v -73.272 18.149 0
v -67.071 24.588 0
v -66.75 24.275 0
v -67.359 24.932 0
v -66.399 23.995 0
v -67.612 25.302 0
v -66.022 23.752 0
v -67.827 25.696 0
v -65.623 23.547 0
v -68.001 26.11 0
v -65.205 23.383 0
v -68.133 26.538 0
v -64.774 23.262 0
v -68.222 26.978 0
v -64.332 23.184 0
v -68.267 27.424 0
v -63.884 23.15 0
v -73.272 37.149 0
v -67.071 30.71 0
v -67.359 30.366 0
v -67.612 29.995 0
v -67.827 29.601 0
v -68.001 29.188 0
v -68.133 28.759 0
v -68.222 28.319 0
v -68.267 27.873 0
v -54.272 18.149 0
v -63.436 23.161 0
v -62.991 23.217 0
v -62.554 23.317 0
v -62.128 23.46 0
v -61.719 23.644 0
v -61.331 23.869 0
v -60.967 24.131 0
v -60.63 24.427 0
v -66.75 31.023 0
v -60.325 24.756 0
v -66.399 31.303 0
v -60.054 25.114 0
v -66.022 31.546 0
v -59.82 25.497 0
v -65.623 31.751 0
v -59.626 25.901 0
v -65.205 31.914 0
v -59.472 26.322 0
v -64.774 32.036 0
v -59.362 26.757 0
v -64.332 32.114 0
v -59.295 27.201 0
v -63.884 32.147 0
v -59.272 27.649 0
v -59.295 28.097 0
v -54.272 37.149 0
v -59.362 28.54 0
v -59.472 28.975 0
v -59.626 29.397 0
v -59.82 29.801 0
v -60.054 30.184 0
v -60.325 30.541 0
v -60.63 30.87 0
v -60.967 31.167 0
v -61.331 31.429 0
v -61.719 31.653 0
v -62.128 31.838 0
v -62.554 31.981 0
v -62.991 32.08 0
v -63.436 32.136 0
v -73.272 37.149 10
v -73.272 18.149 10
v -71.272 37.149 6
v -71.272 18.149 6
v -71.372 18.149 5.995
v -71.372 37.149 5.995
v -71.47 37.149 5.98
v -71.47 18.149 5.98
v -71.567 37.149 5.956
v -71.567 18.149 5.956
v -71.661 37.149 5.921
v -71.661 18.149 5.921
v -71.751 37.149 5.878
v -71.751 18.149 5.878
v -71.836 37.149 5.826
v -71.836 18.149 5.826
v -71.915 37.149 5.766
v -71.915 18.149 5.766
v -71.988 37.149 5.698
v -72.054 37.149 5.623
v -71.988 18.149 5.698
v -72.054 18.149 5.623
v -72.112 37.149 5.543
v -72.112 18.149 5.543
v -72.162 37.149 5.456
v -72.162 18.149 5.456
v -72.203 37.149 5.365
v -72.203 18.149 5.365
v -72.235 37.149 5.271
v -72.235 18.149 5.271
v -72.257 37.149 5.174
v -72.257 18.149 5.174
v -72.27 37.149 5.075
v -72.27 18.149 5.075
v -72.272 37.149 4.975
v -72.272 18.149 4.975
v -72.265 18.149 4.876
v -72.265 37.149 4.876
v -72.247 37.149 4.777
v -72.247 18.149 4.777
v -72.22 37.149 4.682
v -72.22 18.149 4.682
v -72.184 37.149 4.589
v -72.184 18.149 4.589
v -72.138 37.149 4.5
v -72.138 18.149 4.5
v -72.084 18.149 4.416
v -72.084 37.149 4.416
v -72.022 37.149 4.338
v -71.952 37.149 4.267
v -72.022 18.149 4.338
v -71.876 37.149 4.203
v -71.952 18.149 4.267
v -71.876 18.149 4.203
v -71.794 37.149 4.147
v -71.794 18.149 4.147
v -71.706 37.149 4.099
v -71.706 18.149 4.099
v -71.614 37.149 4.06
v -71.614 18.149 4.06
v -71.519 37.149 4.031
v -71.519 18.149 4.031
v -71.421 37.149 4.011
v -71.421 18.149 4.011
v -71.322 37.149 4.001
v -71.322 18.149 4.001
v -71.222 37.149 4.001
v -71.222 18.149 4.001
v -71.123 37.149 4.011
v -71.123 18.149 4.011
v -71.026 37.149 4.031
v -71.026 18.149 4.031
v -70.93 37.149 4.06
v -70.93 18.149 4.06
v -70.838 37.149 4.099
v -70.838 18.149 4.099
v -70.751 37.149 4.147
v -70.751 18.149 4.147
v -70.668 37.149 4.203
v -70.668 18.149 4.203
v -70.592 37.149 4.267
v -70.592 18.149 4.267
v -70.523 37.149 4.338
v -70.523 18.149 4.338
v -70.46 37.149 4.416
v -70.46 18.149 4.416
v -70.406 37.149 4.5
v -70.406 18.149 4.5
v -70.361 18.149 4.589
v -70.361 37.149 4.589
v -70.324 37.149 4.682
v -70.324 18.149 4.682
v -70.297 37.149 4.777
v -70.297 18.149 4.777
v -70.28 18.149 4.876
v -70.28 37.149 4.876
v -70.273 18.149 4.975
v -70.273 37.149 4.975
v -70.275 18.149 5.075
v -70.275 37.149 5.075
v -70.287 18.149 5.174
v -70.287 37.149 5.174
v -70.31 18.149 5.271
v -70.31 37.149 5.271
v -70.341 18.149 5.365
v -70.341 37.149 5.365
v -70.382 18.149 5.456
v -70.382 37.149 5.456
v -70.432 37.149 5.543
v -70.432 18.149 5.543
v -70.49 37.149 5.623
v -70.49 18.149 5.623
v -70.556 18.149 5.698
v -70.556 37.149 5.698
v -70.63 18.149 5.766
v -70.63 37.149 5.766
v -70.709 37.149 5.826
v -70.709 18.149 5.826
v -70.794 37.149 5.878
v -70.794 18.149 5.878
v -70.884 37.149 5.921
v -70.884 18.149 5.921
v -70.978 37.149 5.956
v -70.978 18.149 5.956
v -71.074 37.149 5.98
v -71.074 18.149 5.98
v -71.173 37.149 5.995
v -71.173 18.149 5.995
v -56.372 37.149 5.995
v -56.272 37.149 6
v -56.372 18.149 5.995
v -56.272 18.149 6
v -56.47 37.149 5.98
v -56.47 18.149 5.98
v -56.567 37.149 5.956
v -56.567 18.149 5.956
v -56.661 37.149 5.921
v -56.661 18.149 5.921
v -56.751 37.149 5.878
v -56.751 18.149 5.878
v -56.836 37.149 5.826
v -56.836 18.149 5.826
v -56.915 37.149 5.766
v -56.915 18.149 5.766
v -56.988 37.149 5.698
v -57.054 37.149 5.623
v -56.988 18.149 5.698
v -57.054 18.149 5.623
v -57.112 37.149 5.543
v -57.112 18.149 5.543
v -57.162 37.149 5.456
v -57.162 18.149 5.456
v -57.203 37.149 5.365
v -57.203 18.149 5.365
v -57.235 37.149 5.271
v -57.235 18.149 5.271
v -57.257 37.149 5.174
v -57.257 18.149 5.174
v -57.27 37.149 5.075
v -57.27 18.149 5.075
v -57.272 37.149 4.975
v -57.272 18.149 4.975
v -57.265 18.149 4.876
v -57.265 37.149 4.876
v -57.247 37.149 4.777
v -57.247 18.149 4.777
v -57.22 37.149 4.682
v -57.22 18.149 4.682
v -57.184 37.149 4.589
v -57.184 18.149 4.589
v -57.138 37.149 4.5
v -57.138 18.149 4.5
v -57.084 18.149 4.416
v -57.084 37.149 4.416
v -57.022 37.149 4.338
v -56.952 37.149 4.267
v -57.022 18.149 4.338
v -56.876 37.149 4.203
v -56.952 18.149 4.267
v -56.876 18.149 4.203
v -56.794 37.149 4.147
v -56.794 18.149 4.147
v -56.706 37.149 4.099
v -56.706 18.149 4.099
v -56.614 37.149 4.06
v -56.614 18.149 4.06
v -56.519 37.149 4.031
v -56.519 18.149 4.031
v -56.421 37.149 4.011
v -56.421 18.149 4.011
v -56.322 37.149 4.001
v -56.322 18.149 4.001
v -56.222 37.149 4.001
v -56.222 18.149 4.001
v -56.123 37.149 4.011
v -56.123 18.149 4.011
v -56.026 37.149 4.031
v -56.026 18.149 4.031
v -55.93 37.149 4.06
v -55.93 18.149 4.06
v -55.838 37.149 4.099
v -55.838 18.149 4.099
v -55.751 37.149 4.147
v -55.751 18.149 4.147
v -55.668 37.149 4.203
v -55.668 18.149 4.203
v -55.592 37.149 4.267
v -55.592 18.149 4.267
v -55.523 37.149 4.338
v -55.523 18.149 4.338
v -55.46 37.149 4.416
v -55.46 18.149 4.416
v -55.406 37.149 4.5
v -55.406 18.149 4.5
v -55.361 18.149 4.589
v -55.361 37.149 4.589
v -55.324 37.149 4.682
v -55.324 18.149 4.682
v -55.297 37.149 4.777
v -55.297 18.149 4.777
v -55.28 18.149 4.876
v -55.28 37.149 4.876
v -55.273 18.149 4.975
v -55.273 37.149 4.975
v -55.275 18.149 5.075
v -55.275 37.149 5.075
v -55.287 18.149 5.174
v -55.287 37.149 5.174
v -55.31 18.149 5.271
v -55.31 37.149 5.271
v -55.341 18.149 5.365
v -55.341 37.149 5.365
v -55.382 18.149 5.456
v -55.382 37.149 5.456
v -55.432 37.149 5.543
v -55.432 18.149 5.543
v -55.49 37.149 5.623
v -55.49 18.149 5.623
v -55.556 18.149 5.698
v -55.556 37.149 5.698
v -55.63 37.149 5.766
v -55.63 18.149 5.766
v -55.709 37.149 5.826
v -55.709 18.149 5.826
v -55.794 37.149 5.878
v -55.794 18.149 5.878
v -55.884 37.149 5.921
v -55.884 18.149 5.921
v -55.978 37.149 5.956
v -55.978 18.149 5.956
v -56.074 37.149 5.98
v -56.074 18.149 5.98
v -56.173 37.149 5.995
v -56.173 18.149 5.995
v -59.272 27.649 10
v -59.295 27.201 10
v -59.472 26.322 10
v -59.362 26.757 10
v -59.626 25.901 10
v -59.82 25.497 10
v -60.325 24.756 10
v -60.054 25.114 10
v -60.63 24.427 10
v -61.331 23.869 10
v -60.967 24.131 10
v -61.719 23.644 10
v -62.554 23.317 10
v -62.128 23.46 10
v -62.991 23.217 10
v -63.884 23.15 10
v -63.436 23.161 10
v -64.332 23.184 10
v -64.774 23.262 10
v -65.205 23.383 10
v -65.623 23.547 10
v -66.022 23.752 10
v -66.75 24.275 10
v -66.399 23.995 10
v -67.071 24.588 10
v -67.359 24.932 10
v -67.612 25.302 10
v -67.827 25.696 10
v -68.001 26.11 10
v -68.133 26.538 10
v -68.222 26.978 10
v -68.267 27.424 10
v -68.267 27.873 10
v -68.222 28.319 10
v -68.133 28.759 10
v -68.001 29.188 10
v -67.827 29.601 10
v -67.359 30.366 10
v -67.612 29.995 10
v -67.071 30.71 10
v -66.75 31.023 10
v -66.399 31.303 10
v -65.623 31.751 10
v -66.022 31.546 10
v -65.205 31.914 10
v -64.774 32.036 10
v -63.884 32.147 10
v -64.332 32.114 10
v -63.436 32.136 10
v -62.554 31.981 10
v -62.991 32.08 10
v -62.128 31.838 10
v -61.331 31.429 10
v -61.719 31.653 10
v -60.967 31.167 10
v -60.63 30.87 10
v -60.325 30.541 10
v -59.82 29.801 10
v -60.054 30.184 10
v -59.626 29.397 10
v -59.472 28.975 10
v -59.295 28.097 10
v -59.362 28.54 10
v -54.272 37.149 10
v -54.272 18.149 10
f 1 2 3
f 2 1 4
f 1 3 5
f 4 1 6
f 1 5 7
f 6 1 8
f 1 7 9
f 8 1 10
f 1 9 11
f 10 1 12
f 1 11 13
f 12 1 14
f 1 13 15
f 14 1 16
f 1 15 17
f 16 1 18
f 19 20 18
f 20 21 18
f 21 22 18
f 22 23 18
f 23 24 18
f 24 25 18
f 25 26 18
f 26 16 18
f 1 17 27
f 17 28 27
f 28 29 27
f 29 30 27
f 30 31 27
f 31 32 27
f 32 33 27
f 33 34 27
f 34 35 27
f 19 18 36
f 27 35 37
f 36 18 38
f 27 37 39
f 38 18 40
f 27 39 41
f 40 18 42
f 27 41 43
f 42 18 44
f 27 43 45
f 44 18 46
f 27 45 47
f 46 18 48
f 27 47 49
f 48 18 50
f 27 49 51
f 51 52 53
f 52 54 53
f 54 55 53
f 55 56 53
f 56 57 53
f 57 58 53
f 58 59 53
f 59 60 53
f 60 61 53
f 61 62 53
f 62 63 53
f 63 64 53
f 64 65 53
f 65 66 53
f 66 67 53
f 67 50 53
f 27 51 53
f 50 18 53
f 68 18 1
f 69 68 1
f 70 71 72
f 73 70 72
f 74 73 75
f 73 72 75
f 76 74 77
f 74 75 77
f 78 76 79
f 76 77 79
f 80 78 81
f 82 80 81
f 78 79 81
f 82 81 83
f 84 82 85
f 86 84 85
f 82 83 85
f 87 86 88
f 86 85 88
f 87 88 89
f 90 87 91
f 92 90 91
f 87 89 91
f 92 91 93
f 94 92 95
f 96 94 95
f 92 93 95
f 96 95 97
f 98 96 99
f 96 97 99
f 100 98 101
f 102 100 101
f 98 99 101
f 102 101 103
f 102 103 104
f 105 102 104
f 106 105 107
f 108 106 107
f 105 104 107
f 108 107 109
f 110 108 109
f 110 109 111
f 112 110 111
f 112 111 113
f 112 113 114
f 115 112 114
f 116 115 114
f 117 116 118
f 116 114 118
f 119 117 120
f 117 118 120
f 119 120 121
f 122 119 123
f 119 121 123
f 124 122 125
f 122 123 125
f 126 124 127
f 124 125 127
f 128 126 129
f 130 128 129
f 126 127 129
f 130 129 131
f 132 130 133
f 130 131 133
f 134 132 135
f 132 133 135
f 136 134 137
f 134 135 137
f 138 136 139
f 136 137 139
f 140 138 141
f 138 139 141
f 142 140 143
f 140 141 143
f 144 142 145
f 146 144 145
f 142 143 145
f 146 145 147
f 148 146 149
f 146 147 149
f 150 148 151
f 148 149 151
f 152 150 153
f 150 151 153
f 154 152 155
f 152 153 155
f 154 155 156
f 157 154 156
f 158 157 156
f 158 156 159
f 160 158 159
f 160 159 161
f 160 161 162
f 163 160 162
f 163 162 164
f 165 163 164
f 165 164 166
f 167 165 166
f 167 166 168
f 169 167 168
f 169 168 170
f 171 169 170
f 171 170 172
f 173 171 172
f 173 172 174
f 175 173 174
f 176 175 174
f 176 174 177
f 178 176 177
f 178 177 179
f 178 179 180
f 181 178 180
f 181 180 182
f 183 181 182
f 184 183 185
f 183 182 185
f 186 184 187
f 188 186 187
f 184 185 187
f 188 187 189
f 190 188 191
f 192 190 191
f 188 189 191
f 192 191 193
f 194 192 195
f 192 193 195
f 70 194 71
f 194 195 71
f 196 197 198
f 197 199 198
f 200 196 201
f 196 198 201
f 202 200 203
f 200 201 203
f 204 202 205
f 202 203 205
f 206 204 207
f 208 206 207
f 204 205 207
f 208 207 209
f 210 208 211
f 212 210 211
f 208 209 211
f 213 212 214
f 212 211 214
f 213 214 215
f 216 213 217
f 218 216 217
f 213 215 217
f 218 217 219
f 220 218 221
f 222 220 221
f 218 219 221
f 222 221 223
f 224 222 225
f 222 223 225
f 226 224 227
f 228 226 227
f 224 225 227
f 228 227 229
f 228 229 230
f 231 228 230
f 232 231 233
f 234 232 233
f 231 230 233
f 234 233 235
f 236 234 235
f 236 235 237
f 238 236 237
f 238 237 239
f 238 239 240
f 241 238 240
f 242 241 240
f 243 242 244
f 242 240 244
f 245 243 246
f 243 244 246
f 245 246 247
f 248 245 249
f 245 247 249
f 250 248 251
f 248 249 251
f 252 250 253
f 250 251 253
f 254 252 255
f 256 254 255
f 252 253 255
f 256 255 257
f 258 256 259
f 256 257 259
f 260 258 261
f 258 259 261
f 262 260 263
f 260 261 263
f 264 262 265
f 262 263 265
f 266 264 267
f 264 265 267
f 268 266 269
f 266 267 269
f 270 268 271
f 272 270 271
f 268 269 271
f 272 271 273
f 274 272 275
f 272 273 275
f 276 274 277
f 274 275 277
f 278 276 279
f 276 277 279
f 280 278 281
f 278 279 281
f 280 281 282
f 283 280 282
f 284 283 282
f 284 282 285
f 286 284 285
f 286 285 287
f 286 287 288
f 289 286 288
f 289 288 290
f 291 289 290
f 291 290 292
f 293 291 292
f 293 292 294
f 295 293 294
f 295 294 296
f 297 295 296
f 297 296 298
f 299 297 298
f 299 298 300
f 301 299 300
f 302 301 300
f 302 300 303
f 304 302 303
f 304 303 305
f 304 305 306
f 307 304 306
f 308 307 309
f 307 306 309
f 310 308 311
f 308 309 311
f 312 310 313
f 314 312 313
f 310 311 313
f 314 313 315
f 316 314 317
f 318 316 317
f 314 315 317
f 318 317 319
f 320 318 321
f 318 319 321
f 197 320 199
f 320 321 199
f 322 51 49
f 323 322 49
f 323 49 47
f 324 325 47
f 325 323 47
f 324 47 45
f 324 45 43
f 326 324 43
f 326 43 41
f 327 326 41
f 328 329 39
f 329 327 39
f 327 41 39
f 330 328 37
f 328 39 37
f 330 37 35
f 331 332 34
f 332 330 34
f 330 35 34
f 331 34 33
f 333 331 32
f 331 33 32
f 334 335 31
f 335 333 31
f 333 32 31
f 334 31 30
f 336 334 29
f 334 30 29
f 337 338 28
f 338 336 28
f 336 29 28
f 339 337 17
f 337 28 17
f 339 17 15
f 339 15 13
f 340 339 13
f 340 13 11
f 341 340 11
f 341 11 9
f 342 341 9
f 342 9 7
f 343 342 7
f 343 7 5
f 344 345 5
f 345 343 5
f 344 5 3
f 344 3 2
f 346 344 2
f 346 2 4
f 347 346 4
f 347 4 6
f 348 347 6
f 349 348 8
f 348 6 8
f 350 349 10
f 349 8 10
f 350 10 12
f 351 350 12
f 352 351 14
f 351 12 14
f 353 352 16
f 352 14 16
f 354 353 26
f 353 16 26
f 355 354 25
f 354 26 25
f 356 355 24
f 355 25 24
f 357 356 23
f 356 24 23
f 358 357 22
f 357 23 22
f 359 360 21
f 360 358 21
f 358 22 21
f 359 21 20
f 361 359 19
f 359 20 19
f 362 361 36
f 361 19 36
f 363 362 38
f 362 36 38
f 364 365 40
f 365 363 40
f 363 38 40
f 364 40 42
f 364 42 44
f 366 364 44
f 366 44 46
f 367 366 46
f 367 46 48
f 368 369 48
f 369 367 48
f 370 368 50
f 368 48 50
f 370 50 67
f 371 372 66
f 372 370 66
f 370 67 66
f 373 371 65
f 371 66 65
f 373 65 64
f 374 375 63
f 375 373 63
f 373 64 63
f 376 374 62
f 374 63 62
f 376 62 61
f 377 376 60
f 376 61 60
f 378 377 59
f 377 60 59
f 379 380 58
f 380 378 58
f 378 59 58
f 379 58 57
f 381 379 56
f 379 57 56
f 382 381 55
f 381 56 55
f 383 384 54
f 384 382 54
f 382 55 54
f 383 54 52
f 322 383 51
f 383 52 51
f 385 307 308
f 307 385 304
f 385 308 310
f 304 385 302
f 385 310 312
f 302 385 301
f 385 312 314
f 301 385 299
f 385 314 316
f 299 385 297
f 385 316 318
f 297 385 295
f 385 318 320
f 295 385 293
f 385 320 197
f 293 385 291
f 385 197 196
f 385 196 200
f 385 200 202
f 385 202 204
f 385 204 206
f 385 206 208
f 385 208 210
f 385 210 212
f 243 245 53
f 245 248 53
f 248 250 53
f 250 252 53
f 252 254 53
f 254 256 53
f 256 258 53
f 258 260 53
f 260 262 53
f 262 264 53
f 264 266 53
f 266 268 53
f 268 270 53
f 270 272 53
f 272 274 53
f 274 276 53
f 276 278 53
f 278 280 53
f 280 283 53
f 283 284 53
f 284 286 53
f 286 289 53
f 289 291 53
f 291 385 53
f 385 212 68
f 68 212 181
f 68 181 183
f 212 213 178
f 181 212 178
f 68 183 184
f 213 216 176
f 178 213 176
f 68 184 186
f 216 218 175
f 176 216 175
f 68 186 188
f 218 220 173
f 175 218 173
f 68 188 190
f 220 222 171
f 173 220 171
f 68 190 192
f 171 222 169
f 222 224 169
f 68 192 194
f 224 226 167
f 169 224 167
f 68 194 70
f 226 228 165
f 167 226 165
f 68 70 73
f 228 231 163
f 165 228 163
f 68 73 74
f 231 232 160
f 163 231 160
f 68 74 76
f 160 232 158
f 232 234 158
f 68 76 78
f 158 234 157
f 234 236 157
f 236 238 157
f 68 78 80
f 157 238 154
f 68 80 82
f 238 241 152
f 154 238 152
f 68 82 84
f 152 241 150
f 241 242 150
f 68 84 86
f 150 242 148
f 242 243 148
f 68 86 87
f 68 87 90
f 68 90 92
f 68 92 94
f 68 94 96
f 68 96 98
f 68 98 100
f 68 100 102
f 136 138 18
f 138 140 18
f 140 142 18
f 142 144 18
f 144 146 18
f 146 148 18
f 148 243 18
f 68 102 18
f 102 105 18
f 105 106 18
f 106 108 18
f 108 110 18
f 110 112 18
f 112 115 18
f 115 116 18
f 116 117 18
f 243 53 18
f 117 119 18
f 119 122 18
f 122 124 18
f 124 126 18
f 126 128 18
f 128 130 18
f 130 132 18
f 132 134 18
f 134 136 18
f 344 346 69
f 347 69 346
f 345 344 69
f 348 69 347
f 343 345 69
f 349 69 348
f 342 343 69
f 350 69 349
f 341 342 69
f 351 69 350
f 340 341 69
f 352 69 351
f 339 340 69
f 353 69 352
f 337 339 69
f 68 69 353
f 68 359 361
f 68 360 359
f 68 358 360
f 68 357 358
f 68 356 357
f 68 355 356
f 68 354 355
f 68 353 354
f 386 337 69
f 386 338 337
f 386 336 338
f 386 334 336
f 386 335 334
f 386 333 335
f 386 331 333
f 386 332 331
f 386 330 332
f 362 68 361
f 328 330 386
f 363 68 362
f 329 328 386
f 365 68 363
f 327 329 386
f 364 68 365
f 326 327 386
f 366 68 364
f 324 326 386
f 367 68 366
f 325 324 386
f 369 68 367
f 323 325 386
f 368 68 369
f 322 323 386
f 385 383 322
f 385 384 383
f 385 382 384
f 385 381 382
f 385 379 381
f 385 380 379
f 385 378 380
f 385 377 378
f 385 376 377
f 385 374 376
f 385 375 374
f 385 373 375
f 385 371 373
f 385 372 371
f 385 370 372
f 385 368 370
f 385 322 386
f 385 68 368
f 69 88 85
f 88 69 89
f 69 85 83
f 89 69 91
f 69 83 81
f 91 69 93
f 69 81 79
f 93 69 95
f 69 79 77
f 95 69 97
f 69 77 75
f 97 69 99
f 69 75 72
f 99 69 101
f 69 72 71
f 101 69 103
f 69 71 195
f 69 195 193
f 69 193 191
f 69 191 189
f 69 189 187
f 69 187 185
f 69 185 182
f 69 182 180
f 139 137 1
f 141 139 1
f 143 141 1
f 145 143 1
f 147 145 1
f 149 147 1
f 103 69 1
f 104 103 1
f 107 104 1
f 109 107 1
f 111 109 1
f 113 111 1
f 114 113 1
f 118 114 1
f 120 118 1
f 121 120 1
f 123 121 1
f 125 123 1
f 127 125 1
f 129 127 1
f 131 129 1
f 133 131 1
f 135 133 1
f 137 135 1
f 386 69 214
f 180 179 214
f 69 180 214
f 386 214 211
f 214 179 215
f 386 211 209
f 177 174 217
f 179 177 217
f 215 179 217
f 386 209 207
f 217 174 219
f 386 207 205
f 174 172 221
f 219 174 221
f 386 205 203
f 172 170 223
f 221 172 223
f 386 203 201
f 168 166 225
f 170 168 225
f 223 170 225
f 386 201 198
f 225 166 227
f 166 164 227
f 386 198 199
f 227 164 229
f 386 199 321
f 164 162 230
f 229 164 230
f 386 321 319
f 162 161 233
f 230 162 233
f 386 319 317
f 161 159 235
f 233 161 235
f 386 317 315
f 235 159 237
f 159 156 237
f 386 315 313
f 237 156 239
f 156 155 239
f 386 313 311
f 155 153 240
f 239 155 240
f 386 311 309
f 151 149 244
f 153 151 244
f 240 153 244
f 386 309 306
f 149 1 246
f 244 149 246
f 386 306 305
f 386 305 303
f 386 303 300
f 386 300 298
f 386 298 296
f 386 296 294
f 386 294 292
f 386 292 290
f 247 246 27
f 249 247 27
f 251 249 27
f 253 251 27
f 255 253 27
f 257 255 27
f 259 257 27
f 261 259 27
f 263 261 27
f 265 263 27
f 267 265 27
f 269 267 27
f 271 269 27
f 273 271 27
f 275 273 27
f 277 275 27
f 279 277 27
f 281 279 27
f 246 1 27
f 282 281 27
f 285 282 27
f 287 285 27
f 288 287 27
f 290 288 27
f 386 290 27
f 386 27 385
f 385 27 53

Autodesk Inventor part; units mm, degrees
ref_plane "YZ Plane" through (0, 0, 0) normal (1, 0, 0) x (0, 1, 0)
ref_plane "XZ Plane" through (0, 0, 0) normal (0, 1, 0) x (-1, 0, 0)
sketch "Esquisse1" plane through (0, 0, 0) normal (0, 0, 1) x (1, 0, 0)
  line L0 (-73.2723, 18.1488) -> (-54.2723, 18.1488)
  line L1 (-54.2723, 18.1488) -> (-54.2723, 37.1488)
  line L2 (-54.2723, 37.1488) -> (-73.2723, 37.1488)
  line L3 (-73.2723, 37.1488) -> (-73.2723, 18.1488)
  circle A0 centre (-63.7723, 27.6488) radius 4.5
  point P0 (0, 0)
  dimension "d0" = 19
  dimension "d1" = 19
  dimension "d2" = 9
extrude "Extrusion1" add sketch "Esquisse1" along normal blind 10
sketch "Esquisse2" plane through (-73.2723, 37.1488, 0) normal (0, 1, 0) x (1, 0, 0)
  line L0 (0, 0) -> (0, -10) projected
  line L1 (19, 0) -> (19, -10) projected
  line L2 (19, -10) -> (0, -10) projected
  point P0 (73.2723, 0)
  point P1 (2, -5)
  point P2 (17, -5)
  dimension "d5" = 2
  dimension "d6" = 2
  dimension "d7" = 5
  dimension "d8" = 5
hole "Perçage1" at (-71.2723, 37.1488, 5) at (-56.2723, 37.1488, 5) direction (0, -1, 0) diameter 2 end through all
ref_plane "Plan de construction1" through (-63.7723, 27.6488, 10.9) normal (0, 0, 1) x (1, 0, 0)
properties part number "palier_roulement_bras"
